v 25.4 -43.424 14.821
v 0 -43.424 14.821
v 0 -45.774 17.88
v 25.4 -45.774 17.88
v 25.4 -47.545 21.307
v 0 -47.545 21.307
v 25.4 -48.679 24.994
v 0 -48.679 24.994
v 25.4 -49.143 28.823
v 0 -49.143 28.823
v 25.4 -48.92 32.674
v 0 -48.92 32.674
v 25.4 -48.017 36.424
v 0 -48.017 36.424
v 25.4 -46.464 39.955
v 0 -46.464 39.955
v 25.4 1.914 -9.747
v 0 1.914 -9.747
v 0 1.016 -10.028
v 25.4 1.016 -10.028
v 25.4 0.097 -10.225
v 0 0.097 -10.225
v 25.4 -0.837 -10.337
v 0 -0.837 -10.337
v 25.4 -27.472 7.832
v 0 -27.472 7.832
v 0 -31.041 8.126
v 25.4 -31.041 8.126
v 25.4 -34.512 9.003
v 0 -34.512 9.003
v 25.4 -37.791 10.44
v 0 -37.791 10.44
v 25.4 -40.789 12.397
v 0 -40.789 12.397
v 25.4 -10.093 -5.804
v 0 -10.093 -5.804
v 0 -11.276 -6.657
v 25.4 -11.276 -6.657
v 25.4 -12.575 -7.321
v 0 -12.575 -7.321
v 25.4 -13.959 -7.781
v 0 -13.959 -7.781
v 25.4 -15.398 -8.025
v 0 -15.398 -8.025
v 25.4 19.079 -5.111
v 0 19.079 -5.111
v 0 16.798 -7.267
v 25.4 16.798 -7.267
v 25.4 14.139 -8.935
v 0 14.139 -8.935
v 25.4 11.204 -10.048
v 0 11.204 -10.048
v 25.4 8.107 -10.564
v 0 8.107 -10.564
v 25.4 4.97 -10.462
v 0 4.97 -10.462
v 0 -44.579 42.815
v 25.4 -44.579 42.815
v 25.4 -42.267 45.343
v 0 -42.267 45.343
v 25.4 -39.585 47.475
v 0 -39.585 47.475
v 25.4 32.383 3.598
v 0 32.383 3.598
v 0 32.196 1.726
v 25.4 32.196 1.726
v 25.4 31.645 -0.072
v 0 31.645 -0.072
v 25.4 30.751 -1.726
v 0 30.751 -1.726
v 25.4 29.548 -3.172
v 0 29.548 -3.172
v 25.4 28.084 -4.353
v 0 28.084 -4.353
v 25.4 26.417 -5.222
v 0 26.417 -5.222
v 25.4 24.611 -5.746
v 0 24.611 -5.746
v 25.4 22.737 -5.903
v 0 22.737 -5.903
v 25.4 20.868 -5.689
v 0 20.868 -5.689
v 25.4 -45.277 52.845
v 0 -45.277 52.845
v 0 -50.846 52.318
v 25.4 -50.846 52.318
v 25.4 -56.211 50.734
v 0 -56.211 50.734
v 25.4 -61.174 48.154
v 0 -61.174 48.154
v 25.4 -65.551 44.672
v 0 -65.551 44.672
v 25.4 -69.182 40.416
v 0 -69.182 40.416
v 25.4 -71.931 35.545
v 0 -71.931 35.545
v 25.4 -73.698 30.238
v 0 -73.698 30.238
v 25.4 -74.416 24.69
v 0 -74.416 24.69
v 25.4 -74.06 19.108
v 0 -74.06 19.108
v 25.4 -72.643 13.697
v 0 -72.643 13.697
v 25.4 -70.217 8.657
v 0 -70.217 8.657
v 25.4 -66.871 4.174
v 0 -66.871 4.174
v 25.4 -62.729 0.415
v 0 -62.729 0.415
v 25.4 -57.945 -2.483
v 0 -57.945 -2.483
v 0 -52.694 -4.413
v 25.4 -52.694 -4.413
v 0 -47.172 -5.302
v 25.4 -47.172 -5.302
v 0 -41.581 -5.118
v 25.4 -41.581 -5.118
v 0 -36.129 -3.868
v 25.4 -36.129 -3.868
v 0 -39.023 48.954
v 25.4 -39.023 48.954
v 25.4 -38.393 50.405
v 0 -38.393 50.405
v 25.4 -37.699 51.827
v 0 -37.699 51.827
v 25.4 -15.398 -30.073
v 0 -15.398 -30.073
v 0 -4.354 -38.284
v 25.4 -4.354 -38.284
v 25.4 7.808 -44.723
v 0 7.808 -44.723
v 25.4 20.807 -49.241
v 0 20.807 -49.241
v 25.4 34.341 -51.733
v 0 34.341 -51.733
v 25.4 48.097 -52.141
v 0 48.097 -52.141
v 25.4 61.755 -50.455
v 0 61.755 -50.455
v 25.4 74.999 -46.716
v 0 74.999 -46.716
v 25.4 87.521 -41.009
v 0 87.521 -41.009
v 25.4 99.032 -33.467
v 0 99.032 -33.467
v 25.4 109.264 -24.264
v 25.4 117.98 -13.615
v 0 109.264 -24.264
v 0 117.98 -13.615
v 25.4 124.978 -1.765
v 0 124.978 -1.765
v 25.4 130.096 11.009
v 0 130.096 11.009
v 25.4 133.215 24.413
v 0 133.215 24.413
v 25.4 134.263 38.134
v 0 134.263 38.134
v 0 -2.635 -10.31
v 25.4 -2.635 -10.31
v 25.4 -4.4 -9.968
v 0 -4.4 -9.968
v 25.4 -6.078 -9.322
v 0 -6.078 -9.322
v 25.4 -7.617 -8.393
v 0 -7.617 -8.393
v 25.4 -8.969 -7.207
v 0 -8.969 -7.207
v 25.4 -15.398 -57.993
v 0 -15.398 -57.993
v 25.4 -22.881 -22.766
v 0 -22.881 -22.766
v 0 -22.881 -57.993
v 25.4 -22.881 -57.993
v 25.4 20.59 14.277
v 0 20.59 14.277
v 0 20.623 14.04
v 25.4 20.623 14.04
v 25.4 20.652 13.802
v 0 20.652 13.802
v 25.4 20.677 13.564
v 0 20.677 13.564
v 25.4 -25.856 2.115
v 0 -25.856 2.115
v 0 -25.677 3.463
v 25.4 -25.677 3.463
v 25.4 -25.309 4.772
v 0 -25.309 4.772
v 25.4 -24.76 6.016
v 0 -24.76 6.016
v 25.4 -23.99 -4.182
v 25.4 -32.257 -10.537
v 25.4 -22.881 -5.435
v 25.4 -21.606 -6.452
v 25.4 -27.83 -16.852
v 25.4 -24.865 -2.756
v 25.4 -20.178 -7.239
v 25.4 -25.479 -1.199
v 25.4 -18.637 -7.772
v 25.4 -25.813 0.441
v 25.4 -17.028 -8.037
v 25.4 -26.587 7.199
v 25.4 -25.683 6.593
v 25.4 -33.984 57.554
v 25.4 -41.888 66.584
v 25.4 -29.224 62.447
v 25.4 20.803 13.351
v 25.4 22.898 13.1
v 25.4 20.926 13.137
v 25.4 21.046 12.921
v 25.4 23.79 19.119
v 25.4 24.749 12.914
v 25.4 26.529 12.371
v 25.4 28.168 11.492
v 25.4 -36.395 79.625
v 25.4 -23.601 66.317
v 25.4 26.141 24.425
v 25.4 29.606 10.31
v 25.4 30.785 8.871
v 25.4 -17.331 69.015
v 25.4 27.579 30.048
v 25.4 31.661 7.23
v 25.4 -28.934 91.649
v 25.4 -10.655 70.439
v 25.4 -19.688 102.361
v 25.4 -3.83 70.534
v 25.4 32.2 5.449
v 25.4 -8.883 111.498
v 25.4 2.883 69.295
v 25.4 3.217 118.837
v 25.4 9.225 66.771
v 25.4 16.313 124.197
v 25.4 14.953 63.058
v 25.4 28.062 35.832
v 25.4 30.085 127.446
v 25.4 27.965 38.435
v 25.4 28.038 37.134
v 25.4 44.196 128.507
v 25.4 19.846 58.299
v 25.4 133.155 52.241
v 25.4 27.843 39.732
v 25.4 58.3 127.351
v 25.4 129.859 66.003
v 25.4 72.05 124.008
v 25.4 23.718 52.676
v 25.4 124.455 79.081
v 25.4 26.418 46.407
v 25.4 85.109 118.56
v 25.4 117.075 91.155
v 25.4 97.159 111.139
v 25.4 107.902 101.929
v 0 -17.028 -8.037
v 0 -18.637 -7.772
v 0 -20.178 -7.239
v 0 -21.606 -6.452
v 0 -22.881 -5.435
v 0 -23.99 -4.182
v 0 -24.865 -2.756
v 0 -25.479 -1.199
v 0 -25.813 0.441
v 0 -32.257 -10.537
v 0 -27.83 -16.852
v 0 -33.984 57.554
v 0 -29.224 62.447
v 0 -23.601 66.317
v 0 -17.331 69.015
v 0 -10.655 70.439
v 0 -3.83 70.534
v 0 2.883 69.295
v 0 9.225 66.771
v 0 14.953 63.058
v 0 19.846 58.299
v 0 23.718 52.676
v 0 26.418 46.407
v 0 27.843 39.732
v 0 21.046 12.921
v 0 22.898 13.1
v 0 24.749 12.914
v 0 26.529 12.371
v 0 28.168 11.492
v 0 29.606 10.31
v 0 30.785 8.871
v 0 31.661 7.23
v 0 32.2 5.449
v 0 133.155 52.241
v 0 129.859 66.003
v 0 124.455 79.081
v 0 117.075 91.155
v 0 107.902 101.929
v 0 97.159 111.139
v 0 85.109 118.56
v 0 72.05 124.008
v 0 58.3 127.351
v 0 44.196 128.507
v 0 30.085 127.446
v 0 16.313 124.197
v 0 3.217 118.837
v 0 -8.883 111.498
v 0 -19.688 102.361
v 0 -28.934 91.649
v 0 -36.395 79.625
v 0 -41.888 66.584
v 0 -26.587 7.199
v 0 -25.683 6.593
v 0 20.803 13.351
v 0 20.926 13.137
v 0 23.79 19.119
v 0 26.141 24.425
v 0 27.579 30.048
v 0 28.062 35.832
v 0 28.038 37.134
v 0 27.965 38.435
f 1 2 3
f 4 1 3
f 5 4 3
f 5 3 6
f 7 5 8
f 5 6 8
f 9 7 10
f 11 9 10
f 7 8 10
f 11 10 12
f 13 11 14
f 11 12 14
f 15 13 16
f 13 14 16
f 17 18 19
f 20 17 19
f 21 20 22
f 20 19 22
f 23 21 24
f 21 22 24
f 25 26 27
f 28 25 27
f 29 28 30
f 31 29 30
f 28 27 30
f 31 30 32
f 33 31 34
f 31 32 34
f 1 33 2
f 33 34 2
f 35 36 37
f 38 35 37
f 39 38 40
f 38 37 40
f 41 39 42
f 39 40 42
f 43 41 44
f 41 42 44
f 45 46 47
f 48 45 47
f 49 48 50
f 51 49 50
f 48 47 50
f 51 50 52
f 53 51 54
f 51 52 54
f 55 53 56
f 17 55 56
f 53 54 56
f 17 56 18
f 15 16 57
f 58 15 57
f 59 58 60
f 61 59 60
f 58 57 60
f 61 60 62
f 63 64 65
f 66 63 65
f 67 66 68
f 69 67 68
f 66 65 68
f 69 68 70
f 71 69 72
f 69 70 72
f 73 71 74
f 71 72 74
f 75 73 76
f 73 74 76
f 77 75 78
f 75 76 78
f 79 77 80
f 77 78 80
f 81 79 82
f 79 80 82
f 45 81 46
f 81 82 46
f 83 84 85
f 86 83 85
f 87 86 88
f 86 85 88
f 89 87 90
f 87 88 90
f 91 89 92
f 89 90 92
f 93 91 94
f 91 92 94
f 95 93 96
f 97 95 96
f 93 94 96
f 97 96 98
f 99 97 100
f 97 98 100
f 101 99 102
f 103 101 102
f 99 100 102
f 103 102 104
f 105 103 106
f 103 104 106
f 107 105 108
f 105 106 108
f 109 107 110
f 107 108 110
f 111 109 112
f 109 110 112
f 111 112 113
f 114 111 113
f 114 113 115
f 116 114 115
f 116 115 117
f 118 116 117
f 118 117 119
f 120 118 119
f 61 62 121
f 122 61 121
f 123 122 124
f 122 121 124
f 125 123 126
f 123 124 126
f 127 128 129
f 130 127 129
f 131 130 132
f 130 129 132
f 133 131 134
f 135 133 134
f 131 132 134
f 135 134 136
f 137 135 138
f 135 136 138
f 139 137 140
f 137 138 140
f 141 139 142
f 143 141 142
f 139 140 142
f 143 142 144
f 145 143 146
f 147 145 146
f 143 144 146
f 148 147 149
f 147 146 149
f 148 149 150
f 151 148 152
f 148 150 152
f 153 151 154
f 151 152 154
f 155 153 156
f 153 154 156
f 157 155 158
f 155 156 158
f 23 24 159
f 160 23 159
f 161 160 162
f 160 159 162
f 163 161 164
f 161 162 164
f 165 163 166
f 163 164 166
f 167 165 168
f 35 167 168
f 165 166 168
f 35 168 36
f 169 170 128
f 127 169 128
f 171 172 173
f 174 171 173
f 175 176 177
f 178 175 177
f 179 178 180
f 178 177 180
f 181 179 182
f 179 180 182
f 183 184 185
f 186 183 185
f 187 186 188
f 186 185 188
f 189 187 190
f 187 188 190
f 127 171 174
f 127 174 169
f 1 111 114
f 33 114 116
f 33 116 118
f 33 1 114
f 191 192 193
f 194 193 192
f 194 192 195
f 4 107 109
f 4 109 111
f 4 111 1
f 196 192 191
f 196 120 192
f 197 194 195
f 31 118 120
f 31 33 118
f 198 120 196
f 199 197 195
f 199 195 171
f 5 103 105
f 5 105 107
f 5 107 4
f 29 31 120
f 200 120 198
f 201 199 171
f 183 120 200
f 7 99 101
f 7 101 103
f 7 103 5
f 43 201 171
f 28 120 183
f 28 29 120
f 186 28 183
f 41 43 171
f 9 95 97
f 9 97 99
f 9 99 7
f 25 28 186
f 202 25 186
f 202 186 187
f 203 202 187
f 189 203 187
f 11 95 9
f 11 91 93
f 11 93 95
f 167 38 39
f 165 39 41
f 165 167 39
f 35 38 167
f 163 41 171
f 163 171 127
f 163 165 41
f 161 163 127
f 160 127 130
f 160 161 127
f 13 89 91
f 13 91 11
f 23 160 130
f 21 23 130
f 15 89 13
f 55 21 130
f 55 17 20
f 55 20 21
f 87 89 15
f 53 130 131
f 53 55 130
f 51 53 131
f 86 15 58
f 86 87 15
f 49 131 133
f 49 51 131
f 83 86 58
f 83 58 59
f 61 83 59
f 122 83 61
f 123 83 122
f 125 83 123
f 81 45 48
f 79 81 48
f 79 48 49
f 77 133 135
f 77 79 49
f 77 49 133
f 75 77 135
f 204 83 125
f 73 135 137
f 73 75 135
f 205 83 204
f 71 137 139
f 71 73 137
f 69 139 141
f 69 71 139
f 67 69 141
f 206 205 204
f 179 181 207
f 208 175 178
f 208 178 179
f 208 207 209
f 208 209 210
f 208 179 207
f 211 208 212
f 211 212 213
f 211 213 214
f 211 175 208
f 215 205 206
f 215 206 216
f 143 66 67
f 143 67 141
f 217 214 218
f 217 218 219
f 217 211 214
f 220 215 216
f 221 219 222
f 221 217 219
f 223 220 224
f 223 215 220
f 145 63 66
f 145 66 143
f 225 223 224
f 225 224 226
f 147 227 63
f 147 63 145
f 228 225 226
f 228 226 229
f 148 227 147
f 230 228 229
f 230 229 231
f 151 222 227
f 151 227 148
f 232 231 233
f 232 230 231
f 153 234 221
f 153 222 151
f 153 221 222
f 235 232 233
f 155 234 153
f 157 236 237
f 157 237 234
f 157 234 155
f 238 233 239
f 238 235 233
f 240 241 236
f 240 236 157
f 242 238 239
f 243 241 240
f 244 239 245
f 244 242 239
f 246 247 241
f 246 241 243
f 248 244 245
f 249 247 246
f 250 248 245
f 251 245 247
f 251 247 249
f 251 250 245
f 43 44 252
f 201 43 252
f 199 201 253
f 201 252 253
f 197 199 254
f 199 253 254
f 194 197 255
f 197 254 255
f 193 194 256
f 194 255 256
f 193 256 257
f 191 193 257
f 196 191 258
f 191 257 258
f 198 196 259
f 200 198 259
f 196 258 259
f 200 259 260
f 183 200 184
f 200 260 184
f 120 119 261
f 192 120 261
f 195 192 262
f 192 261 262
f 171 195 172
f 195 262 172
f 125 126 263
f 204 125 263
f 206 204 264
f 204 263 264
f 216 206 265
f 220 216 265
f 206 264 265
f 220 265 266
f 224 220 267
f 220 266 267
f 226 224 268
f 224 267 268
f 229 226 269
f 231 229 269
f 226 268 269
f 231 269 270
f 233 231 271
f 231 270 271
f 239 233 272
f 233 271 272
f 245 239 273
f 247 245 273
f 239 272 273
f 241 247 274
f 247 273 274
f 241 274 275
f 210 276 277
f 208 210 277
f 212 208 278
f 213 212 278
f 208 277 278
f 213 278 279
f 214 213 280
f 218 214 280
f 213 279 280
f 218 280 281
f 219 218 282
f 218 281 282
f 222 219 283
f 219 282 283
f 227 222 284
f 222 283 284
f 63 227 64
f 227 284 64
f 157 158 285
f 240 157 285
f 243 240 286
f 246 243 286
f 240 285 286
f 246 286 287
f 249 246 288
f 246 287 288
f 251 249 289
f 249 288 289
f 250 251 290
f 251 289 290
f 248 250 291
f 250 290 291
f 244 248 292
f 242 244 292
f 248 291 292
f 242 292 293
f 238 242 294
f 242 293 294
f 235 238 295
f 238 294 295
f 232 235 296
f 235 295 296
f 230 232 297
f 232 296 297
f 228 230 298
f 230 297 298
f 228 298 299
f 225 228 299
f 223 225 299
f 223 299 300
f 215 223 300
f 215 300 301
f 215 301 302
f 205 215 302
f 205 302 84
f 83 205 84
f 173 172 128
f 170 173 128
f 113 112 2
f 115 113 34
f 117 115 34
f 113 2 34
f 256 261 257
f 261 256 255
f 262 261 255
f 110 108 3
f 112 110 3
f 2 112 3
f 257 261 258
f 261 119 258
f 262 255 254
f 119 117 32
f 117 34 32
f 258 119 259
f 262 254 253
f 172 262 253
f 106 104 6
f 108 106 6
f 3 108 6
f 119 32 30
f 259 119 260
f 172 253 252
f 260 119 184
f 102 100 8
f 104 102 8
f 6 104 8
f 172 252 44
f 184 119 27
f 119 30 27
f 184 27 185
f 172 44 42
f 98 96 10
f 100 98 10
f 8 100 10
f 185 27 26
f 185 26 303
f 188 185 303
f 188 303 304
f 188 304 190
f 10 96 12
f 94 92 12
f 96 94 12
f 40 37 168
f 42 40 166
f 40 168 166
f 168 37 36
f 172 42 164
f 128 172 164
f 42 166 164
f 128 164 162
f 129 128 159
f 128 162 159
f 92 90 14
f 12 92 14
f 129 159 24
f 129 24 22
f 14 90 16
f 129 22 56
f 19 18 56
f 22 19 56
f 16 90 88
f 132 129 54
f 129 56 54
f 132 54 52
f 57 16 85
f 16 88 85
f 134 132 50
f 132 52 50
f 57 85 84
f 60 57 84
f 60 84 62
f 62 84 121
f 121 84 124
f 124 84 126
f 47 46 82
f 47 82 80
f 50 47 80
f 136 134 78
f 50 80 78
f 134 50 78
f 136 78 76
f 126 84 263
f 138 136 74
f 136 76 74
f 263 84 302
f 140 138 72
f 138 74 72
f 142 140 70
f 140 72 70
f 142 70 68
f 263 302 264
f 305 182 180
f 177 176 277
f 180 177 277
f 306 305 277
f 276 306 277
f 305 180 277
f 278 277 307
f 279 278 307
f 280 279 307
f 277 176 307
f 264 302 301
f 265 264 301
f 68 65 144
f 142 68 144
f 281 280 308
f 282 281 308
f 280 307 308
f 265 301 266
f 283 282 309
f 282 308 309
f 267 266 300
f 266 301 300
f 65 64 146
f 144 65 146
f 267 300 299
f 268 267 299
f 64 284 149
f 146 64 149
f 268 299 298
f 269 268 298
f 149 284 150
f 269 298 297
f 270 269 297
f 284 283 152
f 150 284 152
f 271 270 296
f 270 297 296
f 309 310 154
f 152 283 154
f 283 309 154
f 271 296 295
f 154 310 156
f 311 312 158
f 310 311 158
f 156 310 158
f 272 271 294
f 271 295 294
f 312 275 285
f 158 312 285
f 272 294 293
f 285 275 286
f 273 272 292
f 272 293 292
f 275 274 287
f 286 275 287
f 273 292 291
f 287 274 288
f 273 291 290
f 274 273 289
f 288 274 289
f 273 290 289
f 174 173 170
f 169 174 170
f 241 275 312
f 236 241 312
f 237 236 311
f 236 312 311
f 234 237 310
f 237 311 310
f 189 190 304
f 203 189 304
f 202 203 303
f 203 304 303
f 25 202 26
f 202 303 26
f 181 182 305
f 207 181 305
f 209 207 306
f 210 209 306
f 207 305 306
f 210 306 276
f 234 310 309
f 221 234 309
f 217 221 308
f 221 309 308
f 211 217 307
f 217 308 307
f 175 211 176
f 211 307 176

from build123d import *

# Parameters (mm, degrees)
F1_DEPTH = 25.4


with BuildPart() as f1:
    # F0 (on Right) → F1 (new body)
    with BuildSketch(Plane.YZ):
        with BuildLine():
            Line((-22.8805579245, -22.7664159755), (-22.8805579245, -57.9928606749))
            Line((-22.8805579245, -57.9928606749), (-15.3976082802, -57.9928606749))
            Line((-15.3976082802, -57.9928606749), (-15.3976082802, -30.0726670171))
            ThreePointArc((-15.3976082802, -30.0726670171), (-19.2448601213, -26.5278766879), (-22.8805579245, -22.7664159755))
        make_face()
        with BuildLine():
            ThreePointArc((-36.1290082754, -3.8675027801), (-30.1105807858, -13.7416335631), (-22.8805579245, -22.7664159755))
            Line((-22.8805579245, -22.7664159755), (-22.8805579245, -5.4353086614))
            ThreePointArc((-22.8805579245, -5.4353086614), (-25.2060971884, -1.990536454), (-25.8564343771, 2.1145396683))
            ThreePointArc((-25.8564343771, 2.1145396683), (-30.6840356791, -1.4065674169), (-36.1290082754, -3.8675027801))
        make_face()
        with BuildLine():
            ThreePointArc((-45.277106552, 52.8451455313), (-74.0603906155, 19.1080787818), (-36.1290082754, -3.8675027801))
            ThreePointArc((-36.1290082754, -3.8675027801), (-40.2966096051, 5.2739283062), (-43.4237891642, 14.8214626034))
            ThreePointArc((-43.4237891642, 14.8214626034), (-48.9964160146, 26.897956874), (-46.4641223034, 39.9548850136))
            ThreePointArc((-46.4641223034, 39.9548850136), (-46.1017075688, 46.4212957732), (-45.277106552, 52.8451455313))
        make_face()
        with BuildLine():
            Line((-22.8805579245, -5.4353086614), (-22.8805579245, -22.7664159755))
            ThreePointArc((-22.8805579245, -22.7664159755), (-19.2448601213, -26.5278766879), (-15.3976082802, -30.0726670171))
            Line((-15.3976082802, -30.0726670171), (-15.3976082802, -8.0253607773))
            ThreePointArc((-15.3976082802, -8.0253607773), (-19.4187756139, -7.5383976022), (-22.8805579245, -5.4353086614))
        make_face()
        with BuildLine():
            ThreePointArc((-37.6985580456, 51.8270156729), (-41.4542478809, 52.5860694794), (-45.277106552, 52.8451455313))
            ThreePointArc((-45.277106552, 52.8451455313), (-46.1017075688, 46.4212957732), (-46.4641223034, 39.9548850136))
            ThreePointArc((-46.4641223034, 39.9548850136), (-43.4730918643, 44.1250016569), (-39.5852366825, 47.474735675))
            ThreePointArc((-39.5852366825, 47.474735675), (-38.7160866571, 49.6830361403), (-37.6985580456, 51.8270156729))
        make_face()
        with BuildLine():
            ThreePointArc((-43.4237891642, 14.8214626034), (-40.2966096051, 5.2739283062), (-36.1290082754, -3.8675027801))
            ThreePointArc((-36.1290082754, -3.8675027801), (-30.6840356791, -1.4065674169), (-25.8564343771, 2.1145396683))
            ThreePointArc((-25.8564343771, 2.1145396683), (-25.5163637625, 4.1239695154), (-24.7595102264, 6.0162245347))
            ThreePointArc((-24.7595102264, 6.0162245347), (-26.1371840828, 6.8924645223), (-27.4722746733, 7.8323128533))
            ThreePointArc((-27.4722746733, 7.8323128533), (-36.1811250997, 9.6537304893), (-43.4237891642, 14.8214626034))
        make_face()
        with BuildLine():
            Line((-15.3976082802, -8.0253607773), (-15.3976082802, -30.0726670171))
            ThreePointArc((-15.3976082802, -30.0726670171), (81.3685508669, -44.1009938677), (134.2632217545, 38.1342619658))
            ThreePointArc((134.2632217545, 38.1342619658), (51.2704704846, 128.2052611604), (-45.277106552, 52.8451455313))
            ThreePointArc((-45.277106552, 52.8451455313), (-41.4542478809, 52.5860694794), (-37.6985580456, 51.8270156729))
            ThreePointArc((-37.6985580456, 51.8270156729), (-0.4432478699, 70.0792033475), (27.8432110431, 39.7316048698))
            ThreePointArc((27.8432110431, 39.7316048698), (56.2702105218, 30.9904843235), (68.5100917864, 3.8853778969))
            ThreePointArc((68.5100917864, 3.8853778969), (39.6372370921, -31.5098645214), (-0.8370252167, -10.336791655))
            ThreePointArc((-0.8370252167, -10.336791655), (-6.0781786291, -9.3223624176), (-10.0928384047, -5.8036605751))
            ThreePointArc((-10.0928384047, -5.8036605751), (-12.5748209934, -7.3213816154), (-15.3976082802, -8.0253607773))
        make_face()
        with BuildLine():
            ThreePointArc((1.9137445003, -9.7472674078), (0.558740927, -10.1371303225), (-0.8370252167, -10.336791655))
            ThreePointArc((-0.8370252167, -10.336791655), (39.6372370921, -31.5098645214), (68.5100917864, 3.8853778969))
            ThreePointArc((68.5100917864, 3.8853778969), (56.2702105218, 30.9904843235), (27.8432110431, 39.7316048698))
            ThreePointArc((27.8432110431, 39.7316048698), (28.0074467559, 37.7847839297), (28.0622494863, 35.8318164945))
            ThreePointArc((28.0622494863, 35.8318164945), (26.1412305096, 24.4251830851), (20.5901041712, 14.2769519082))
            ThreePointArc((20.5901041712, 14.2769519082), (20.6380886941, 13.9210160561), (20.6769120054, 13.5639648052))
            ThreePointArc((20.6769120054, 13.5639648052), (20.8650675932, 13.24447129), (21.0457330933, 12.9206833832))
            ThreePointArc((21.0457330933, 12.9206833832), (28.9159774204, 10.9365568541), (32.3825042542, 3.597572213))
            ThreePointArc((32.3825042542, 3.597572213), (28.0844870819, -4.352654537), (19.0786813985, -5.1106261617))
            ThreePointArc((19.0786813985, -5.1106261617), (11.203643005, -10.0478667355), (1.9137445003, -9.7472674078))
        make_face()
    extrude(amount=F1_DEPTH)


solid = f1.part
